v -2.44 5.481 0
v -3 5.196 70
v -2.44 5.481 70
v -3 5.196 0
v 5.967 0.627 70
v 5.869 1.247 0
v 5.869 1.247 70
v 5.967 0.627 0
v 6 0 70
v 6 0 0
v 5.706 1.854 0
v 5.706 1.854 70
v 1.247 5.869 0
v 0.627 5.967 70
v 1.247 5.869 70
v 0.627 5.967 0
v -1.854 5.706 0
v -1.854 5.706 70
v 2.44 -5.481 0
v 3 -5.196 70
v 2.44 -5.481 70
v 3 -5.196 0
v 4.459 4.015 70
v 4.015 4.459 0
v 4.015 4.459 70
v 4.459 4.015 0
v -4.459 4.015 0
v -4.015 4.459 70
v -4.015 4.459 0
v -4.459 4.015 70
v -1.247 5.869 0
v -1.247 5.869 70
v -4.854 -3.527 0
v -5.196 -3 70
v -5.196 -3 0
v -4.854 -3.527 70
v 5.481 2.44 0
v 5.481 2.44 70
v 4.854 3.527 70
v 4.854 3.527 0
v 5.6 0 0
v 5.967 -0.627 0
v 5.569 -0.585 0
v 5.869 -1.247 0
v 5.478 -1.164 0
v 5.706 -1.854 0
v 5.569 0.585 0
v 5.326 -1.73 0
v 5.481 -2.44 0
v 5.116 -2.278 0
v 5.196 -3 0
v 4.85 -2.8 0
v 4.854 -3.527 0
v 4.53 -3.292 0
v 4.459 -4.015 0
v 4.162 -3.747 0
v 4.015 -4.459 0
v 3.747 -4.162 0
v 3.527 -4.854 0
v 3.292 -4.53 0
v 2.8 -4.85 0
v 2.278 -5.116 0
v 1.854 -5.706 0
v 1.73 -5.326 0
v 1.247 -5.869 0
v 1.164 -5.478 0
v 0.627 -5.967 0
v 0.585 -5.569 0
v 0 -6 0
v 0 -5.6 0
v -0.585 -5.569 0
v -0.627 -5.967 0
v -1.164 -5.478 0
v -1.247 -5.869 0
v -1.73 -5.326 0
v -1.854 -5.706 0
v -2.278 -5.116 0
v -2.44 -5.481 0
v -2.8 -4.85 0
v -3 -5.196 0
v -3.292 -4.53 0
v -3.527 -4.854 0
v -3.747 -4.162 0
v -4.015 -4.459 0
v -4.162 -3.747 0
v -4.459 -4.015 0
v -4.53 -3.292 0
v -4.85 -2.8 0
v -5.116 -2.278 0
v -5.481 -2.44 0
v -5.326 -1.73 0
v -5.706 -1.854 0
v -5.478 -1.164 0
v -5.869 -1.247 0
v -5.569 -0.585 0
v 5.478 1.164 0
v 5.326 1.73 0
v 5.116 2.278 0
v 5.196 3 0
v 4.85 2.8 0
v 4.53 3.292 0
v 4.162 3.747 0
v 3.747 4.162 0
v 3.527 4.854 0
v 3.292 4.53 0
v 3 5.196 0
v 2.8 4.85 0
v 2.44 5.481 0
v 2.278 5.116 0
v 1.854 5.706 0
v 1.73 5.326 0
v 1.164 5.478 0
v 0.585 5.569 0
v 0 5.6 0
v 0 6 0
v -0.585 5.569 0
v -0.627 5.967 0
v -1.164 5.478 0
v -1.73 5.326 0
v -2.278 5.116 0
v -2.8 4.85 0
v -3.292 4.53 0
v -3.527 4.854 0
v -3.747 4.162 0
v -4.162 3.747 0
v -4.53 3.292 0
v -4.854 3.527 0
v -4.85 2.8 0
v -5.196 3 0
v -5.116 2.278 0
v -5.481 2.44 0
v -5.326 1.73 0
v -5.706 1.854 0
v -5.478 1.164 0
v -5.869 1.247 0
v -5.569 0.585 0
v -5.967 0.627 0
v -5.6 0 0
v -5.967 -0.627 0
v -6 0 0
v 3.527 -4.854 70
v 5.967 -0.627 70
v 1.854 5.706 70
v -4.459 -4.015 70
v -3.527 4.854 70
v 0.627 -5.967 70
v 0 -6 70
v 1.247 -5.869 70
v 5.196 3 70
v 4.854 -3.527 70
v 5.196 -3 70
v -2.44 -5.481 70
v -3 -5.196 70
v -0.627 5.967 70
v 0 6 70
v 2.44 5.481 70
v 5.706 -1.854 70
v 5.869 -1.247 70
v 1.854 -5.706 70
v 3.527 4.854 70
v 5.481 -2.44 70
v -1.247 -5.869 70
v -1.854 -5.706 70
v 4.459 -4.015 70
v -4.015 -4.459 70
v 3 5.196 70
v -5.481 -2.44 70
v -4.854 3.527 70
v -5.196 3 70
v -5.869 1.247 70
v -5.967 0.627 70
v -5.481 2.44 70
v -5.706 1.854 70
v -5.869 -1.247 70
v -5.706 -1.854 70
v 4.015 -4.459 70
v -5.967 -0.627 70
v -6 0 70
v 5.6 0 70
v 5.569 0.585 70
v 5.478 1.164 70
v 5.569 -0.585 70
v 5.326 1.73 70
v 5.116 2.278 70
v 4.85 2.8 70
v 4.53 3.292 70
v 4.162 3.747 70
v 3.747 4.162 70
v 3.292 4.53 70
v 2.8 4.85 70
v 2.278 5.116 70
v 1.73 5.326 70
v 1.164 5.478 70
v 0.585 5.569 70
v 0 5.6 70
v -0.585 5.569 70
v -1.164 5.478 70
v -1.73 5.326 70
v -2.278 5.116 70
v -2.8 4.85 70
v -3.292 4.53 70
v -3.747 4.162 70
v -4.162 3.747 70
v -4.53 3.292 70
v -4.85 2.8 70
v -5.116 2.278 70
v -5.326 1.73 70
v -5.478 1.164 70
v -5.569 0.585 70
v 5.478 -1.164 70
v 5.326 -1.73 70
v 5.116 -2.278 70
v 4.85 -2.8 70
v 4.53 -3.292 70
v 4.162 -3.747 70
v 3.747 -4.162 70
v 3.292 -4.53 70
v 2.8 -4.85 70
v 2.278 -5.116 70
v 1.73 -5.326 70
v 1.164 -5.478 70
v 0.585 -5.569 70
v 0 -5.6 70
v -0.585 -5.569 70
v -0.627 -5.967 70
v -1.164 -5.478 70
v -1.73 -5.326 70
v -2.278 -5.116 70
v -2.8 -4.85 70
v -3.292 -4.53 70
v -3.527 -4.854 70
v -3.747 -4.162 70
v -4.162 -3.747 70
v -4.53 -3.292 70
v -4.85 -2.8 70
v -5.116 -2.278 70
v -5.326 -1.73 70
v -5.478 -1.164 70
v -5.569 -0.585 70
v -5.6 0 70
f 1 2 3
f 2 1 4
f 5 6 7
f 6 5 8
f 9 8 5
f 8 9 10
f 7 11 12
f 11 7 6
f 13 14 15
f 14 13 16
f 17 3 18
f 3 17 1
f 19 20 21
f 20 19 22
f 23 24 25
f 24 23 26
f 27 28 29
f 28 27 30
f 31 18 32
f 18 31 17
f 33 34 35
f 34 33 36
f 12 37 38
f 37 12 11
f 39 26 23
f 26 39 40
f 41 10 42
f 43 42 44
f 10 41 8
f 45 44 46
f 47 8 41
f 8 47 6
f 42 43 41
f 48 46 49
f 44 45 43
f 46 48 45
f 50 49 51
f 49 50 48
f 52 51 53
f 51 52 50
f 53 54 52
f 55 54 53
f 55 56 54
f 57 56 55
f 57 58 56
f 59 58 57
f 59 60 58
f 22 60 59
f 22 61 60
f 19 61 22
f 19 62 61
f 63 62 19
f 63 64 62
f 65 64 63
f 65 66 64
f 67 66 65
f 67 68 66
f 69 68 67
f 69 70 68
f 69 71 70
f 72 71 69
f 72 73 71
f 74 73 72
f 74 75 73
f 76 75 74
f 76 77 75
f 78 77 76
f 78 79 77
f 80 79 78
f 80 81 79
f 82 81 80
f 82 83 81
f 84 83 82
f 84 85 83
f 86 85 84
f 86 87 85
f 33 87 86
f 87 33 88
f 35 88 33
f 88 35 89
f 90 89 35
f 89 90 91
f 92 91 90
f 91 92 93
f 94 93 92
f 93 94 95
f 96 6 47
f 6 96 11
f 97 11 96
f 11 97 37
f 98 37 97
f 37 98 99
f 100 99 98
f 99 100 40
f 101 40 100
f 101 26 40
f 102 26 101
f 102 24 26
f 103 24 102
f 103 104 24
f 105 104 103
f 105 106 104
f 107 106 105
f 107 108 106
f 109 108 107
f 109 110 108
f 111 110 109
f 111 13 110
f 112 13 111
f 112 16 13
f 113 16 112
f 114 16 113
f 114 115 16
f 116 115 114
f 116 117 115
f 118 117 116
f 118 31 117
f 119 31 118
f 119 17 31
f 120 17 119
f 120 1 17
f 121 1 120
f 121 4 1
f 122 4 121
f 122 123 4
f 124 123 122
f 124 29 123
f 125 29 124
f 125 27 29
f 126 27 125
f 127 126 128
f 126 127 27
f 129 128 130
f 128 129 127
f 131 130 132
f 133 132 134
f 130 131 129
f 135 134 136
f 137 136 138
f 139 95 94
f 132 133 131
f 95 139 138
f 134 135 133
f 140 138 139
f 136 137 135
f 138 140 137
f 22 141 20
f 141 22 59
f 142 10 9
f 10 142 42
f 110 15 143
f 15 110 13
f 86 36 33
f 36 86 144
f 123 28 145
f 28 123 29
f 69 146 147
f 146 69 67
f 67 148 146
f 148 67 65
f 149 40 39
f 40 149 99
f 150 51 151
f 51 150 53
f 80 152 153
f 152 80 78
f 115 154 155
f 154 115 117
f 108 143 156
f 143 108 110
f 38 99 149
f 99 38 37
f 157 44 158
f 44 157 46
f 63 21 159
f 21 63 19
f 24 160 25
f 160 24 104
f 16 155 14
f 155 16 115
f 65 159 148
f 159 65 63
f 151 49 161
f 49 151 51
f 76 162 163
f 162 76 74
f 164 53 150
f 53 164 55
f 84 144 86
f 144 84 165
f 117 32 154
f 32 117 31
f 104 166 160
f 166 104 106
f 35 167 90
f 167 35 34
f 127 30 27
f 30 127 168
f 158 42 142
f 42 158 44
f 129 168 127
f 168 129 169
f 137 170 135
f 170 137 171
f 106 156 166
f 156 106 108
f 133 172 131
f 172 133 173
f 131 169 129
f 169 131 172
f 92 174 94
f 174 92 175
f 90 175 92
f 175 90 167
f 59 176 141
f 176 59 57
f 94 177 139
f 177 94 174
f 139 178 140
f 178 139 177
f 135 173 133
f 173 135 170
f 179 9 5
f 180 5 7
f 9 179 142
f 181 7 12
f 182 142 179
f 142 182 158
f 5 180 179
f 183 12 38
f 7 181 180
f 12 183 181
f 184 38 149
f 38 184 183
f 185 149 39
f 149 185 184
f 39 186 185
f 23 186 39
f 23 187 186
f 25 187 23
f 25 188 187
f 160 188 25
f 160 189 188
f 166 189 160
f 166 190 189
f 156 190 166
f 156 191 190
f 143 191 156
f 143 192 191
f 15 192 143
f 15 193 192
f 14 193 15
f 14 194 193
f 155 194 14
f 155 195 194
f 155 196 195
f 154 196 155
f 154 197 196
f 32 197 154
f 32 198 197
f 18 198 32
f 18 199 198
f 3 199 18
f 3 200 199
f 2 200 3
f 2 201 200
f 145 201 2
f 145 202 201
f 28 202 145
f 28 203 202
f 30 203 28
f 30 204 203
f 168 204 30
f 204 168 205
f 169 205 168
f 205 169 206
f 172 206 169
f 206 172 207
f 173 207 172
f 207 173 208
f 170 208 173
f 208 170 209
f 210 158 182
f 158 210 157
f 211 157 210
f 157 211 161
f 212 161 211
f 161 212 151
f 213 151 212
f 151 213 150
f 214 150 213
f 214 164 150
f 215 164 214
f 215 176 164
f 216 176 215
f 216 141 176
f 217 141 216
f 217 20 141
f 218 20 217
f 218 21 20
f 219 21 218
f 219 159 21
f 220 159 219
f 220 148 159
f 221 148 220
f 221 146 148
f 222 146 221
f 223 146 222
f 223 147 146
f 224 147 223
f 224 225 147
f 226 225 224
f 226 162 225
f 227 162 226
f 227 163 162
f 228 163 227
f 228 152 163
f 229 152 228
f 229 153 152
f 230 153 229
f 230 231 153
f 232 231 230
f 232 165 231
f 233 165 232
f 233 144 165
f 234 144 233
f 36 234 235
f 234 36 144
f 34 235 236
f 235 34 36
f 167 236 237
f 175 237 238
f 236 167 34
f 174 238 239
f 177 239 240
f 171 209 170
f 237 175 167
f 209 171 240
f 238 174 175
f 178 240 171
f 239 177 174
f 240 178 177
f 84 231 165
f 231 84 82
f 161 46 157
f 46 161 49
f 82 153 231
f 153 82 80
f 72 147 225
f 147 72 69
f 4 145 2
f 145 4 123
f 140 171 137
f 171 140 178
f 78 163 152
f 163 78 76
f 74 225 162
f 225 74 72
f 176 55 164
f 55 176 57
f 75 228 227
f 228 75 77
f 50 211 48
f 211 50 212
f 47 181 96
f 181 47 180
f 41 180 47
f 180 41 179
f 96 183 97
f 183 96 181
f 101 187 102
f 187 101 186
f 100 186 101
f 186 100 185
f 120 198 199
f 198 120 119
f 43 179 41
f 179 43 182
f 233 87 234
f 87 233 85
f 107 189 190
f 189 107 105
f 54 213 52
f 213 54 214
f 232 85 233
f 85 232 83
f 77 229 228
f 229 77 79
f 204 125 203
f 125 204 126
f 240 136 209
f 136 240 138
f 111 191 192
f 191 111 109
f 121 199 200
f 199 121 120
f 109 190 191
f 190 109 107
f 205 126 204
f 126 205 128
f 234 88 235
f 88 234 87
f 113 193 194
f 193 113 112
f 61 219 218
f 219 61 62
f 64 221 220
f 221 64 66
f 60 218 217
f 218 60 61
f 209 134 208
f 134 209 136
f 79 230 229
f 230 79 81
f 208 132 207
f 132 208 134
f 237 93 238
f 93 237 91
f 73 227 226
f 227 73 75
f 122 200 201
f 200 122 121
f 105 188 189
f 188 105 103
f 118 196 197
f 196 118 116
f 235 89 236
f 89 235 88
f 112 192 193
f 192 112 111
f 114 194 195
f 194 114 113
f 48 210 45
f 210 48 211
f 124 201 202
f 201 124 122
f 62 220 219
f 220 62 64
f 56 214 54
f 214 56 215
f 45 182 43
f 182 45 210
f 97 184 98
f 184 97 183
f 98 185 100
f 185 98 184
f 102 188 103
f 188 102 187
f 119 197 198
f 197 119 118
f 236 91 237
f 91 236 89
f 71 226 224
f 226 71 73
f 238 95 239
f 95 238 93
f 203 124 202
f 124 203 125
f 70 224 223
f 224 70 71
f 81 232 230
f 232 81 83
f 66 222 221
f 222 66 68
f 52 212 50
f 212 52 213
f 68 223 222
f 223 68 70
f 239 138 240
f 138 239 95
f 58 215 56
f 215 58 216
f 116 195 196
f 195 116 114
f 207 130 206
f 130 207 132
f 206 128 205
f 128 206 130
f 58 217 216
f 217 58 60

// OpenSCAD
Tube();

module Tube(
	height			= 70,
	outerRadius		= 6,
	wallThickness	= 0.4
)
{
	innerRadius = outerRadius - wallThickness;
	difference(){
		cylinder(h=height,r=outerRadius, $fn=60);
		translate([0, 0, -0.5]) cylinder(h=height + 1, r=innerRadius, $fn=60);
	} // difference
}
